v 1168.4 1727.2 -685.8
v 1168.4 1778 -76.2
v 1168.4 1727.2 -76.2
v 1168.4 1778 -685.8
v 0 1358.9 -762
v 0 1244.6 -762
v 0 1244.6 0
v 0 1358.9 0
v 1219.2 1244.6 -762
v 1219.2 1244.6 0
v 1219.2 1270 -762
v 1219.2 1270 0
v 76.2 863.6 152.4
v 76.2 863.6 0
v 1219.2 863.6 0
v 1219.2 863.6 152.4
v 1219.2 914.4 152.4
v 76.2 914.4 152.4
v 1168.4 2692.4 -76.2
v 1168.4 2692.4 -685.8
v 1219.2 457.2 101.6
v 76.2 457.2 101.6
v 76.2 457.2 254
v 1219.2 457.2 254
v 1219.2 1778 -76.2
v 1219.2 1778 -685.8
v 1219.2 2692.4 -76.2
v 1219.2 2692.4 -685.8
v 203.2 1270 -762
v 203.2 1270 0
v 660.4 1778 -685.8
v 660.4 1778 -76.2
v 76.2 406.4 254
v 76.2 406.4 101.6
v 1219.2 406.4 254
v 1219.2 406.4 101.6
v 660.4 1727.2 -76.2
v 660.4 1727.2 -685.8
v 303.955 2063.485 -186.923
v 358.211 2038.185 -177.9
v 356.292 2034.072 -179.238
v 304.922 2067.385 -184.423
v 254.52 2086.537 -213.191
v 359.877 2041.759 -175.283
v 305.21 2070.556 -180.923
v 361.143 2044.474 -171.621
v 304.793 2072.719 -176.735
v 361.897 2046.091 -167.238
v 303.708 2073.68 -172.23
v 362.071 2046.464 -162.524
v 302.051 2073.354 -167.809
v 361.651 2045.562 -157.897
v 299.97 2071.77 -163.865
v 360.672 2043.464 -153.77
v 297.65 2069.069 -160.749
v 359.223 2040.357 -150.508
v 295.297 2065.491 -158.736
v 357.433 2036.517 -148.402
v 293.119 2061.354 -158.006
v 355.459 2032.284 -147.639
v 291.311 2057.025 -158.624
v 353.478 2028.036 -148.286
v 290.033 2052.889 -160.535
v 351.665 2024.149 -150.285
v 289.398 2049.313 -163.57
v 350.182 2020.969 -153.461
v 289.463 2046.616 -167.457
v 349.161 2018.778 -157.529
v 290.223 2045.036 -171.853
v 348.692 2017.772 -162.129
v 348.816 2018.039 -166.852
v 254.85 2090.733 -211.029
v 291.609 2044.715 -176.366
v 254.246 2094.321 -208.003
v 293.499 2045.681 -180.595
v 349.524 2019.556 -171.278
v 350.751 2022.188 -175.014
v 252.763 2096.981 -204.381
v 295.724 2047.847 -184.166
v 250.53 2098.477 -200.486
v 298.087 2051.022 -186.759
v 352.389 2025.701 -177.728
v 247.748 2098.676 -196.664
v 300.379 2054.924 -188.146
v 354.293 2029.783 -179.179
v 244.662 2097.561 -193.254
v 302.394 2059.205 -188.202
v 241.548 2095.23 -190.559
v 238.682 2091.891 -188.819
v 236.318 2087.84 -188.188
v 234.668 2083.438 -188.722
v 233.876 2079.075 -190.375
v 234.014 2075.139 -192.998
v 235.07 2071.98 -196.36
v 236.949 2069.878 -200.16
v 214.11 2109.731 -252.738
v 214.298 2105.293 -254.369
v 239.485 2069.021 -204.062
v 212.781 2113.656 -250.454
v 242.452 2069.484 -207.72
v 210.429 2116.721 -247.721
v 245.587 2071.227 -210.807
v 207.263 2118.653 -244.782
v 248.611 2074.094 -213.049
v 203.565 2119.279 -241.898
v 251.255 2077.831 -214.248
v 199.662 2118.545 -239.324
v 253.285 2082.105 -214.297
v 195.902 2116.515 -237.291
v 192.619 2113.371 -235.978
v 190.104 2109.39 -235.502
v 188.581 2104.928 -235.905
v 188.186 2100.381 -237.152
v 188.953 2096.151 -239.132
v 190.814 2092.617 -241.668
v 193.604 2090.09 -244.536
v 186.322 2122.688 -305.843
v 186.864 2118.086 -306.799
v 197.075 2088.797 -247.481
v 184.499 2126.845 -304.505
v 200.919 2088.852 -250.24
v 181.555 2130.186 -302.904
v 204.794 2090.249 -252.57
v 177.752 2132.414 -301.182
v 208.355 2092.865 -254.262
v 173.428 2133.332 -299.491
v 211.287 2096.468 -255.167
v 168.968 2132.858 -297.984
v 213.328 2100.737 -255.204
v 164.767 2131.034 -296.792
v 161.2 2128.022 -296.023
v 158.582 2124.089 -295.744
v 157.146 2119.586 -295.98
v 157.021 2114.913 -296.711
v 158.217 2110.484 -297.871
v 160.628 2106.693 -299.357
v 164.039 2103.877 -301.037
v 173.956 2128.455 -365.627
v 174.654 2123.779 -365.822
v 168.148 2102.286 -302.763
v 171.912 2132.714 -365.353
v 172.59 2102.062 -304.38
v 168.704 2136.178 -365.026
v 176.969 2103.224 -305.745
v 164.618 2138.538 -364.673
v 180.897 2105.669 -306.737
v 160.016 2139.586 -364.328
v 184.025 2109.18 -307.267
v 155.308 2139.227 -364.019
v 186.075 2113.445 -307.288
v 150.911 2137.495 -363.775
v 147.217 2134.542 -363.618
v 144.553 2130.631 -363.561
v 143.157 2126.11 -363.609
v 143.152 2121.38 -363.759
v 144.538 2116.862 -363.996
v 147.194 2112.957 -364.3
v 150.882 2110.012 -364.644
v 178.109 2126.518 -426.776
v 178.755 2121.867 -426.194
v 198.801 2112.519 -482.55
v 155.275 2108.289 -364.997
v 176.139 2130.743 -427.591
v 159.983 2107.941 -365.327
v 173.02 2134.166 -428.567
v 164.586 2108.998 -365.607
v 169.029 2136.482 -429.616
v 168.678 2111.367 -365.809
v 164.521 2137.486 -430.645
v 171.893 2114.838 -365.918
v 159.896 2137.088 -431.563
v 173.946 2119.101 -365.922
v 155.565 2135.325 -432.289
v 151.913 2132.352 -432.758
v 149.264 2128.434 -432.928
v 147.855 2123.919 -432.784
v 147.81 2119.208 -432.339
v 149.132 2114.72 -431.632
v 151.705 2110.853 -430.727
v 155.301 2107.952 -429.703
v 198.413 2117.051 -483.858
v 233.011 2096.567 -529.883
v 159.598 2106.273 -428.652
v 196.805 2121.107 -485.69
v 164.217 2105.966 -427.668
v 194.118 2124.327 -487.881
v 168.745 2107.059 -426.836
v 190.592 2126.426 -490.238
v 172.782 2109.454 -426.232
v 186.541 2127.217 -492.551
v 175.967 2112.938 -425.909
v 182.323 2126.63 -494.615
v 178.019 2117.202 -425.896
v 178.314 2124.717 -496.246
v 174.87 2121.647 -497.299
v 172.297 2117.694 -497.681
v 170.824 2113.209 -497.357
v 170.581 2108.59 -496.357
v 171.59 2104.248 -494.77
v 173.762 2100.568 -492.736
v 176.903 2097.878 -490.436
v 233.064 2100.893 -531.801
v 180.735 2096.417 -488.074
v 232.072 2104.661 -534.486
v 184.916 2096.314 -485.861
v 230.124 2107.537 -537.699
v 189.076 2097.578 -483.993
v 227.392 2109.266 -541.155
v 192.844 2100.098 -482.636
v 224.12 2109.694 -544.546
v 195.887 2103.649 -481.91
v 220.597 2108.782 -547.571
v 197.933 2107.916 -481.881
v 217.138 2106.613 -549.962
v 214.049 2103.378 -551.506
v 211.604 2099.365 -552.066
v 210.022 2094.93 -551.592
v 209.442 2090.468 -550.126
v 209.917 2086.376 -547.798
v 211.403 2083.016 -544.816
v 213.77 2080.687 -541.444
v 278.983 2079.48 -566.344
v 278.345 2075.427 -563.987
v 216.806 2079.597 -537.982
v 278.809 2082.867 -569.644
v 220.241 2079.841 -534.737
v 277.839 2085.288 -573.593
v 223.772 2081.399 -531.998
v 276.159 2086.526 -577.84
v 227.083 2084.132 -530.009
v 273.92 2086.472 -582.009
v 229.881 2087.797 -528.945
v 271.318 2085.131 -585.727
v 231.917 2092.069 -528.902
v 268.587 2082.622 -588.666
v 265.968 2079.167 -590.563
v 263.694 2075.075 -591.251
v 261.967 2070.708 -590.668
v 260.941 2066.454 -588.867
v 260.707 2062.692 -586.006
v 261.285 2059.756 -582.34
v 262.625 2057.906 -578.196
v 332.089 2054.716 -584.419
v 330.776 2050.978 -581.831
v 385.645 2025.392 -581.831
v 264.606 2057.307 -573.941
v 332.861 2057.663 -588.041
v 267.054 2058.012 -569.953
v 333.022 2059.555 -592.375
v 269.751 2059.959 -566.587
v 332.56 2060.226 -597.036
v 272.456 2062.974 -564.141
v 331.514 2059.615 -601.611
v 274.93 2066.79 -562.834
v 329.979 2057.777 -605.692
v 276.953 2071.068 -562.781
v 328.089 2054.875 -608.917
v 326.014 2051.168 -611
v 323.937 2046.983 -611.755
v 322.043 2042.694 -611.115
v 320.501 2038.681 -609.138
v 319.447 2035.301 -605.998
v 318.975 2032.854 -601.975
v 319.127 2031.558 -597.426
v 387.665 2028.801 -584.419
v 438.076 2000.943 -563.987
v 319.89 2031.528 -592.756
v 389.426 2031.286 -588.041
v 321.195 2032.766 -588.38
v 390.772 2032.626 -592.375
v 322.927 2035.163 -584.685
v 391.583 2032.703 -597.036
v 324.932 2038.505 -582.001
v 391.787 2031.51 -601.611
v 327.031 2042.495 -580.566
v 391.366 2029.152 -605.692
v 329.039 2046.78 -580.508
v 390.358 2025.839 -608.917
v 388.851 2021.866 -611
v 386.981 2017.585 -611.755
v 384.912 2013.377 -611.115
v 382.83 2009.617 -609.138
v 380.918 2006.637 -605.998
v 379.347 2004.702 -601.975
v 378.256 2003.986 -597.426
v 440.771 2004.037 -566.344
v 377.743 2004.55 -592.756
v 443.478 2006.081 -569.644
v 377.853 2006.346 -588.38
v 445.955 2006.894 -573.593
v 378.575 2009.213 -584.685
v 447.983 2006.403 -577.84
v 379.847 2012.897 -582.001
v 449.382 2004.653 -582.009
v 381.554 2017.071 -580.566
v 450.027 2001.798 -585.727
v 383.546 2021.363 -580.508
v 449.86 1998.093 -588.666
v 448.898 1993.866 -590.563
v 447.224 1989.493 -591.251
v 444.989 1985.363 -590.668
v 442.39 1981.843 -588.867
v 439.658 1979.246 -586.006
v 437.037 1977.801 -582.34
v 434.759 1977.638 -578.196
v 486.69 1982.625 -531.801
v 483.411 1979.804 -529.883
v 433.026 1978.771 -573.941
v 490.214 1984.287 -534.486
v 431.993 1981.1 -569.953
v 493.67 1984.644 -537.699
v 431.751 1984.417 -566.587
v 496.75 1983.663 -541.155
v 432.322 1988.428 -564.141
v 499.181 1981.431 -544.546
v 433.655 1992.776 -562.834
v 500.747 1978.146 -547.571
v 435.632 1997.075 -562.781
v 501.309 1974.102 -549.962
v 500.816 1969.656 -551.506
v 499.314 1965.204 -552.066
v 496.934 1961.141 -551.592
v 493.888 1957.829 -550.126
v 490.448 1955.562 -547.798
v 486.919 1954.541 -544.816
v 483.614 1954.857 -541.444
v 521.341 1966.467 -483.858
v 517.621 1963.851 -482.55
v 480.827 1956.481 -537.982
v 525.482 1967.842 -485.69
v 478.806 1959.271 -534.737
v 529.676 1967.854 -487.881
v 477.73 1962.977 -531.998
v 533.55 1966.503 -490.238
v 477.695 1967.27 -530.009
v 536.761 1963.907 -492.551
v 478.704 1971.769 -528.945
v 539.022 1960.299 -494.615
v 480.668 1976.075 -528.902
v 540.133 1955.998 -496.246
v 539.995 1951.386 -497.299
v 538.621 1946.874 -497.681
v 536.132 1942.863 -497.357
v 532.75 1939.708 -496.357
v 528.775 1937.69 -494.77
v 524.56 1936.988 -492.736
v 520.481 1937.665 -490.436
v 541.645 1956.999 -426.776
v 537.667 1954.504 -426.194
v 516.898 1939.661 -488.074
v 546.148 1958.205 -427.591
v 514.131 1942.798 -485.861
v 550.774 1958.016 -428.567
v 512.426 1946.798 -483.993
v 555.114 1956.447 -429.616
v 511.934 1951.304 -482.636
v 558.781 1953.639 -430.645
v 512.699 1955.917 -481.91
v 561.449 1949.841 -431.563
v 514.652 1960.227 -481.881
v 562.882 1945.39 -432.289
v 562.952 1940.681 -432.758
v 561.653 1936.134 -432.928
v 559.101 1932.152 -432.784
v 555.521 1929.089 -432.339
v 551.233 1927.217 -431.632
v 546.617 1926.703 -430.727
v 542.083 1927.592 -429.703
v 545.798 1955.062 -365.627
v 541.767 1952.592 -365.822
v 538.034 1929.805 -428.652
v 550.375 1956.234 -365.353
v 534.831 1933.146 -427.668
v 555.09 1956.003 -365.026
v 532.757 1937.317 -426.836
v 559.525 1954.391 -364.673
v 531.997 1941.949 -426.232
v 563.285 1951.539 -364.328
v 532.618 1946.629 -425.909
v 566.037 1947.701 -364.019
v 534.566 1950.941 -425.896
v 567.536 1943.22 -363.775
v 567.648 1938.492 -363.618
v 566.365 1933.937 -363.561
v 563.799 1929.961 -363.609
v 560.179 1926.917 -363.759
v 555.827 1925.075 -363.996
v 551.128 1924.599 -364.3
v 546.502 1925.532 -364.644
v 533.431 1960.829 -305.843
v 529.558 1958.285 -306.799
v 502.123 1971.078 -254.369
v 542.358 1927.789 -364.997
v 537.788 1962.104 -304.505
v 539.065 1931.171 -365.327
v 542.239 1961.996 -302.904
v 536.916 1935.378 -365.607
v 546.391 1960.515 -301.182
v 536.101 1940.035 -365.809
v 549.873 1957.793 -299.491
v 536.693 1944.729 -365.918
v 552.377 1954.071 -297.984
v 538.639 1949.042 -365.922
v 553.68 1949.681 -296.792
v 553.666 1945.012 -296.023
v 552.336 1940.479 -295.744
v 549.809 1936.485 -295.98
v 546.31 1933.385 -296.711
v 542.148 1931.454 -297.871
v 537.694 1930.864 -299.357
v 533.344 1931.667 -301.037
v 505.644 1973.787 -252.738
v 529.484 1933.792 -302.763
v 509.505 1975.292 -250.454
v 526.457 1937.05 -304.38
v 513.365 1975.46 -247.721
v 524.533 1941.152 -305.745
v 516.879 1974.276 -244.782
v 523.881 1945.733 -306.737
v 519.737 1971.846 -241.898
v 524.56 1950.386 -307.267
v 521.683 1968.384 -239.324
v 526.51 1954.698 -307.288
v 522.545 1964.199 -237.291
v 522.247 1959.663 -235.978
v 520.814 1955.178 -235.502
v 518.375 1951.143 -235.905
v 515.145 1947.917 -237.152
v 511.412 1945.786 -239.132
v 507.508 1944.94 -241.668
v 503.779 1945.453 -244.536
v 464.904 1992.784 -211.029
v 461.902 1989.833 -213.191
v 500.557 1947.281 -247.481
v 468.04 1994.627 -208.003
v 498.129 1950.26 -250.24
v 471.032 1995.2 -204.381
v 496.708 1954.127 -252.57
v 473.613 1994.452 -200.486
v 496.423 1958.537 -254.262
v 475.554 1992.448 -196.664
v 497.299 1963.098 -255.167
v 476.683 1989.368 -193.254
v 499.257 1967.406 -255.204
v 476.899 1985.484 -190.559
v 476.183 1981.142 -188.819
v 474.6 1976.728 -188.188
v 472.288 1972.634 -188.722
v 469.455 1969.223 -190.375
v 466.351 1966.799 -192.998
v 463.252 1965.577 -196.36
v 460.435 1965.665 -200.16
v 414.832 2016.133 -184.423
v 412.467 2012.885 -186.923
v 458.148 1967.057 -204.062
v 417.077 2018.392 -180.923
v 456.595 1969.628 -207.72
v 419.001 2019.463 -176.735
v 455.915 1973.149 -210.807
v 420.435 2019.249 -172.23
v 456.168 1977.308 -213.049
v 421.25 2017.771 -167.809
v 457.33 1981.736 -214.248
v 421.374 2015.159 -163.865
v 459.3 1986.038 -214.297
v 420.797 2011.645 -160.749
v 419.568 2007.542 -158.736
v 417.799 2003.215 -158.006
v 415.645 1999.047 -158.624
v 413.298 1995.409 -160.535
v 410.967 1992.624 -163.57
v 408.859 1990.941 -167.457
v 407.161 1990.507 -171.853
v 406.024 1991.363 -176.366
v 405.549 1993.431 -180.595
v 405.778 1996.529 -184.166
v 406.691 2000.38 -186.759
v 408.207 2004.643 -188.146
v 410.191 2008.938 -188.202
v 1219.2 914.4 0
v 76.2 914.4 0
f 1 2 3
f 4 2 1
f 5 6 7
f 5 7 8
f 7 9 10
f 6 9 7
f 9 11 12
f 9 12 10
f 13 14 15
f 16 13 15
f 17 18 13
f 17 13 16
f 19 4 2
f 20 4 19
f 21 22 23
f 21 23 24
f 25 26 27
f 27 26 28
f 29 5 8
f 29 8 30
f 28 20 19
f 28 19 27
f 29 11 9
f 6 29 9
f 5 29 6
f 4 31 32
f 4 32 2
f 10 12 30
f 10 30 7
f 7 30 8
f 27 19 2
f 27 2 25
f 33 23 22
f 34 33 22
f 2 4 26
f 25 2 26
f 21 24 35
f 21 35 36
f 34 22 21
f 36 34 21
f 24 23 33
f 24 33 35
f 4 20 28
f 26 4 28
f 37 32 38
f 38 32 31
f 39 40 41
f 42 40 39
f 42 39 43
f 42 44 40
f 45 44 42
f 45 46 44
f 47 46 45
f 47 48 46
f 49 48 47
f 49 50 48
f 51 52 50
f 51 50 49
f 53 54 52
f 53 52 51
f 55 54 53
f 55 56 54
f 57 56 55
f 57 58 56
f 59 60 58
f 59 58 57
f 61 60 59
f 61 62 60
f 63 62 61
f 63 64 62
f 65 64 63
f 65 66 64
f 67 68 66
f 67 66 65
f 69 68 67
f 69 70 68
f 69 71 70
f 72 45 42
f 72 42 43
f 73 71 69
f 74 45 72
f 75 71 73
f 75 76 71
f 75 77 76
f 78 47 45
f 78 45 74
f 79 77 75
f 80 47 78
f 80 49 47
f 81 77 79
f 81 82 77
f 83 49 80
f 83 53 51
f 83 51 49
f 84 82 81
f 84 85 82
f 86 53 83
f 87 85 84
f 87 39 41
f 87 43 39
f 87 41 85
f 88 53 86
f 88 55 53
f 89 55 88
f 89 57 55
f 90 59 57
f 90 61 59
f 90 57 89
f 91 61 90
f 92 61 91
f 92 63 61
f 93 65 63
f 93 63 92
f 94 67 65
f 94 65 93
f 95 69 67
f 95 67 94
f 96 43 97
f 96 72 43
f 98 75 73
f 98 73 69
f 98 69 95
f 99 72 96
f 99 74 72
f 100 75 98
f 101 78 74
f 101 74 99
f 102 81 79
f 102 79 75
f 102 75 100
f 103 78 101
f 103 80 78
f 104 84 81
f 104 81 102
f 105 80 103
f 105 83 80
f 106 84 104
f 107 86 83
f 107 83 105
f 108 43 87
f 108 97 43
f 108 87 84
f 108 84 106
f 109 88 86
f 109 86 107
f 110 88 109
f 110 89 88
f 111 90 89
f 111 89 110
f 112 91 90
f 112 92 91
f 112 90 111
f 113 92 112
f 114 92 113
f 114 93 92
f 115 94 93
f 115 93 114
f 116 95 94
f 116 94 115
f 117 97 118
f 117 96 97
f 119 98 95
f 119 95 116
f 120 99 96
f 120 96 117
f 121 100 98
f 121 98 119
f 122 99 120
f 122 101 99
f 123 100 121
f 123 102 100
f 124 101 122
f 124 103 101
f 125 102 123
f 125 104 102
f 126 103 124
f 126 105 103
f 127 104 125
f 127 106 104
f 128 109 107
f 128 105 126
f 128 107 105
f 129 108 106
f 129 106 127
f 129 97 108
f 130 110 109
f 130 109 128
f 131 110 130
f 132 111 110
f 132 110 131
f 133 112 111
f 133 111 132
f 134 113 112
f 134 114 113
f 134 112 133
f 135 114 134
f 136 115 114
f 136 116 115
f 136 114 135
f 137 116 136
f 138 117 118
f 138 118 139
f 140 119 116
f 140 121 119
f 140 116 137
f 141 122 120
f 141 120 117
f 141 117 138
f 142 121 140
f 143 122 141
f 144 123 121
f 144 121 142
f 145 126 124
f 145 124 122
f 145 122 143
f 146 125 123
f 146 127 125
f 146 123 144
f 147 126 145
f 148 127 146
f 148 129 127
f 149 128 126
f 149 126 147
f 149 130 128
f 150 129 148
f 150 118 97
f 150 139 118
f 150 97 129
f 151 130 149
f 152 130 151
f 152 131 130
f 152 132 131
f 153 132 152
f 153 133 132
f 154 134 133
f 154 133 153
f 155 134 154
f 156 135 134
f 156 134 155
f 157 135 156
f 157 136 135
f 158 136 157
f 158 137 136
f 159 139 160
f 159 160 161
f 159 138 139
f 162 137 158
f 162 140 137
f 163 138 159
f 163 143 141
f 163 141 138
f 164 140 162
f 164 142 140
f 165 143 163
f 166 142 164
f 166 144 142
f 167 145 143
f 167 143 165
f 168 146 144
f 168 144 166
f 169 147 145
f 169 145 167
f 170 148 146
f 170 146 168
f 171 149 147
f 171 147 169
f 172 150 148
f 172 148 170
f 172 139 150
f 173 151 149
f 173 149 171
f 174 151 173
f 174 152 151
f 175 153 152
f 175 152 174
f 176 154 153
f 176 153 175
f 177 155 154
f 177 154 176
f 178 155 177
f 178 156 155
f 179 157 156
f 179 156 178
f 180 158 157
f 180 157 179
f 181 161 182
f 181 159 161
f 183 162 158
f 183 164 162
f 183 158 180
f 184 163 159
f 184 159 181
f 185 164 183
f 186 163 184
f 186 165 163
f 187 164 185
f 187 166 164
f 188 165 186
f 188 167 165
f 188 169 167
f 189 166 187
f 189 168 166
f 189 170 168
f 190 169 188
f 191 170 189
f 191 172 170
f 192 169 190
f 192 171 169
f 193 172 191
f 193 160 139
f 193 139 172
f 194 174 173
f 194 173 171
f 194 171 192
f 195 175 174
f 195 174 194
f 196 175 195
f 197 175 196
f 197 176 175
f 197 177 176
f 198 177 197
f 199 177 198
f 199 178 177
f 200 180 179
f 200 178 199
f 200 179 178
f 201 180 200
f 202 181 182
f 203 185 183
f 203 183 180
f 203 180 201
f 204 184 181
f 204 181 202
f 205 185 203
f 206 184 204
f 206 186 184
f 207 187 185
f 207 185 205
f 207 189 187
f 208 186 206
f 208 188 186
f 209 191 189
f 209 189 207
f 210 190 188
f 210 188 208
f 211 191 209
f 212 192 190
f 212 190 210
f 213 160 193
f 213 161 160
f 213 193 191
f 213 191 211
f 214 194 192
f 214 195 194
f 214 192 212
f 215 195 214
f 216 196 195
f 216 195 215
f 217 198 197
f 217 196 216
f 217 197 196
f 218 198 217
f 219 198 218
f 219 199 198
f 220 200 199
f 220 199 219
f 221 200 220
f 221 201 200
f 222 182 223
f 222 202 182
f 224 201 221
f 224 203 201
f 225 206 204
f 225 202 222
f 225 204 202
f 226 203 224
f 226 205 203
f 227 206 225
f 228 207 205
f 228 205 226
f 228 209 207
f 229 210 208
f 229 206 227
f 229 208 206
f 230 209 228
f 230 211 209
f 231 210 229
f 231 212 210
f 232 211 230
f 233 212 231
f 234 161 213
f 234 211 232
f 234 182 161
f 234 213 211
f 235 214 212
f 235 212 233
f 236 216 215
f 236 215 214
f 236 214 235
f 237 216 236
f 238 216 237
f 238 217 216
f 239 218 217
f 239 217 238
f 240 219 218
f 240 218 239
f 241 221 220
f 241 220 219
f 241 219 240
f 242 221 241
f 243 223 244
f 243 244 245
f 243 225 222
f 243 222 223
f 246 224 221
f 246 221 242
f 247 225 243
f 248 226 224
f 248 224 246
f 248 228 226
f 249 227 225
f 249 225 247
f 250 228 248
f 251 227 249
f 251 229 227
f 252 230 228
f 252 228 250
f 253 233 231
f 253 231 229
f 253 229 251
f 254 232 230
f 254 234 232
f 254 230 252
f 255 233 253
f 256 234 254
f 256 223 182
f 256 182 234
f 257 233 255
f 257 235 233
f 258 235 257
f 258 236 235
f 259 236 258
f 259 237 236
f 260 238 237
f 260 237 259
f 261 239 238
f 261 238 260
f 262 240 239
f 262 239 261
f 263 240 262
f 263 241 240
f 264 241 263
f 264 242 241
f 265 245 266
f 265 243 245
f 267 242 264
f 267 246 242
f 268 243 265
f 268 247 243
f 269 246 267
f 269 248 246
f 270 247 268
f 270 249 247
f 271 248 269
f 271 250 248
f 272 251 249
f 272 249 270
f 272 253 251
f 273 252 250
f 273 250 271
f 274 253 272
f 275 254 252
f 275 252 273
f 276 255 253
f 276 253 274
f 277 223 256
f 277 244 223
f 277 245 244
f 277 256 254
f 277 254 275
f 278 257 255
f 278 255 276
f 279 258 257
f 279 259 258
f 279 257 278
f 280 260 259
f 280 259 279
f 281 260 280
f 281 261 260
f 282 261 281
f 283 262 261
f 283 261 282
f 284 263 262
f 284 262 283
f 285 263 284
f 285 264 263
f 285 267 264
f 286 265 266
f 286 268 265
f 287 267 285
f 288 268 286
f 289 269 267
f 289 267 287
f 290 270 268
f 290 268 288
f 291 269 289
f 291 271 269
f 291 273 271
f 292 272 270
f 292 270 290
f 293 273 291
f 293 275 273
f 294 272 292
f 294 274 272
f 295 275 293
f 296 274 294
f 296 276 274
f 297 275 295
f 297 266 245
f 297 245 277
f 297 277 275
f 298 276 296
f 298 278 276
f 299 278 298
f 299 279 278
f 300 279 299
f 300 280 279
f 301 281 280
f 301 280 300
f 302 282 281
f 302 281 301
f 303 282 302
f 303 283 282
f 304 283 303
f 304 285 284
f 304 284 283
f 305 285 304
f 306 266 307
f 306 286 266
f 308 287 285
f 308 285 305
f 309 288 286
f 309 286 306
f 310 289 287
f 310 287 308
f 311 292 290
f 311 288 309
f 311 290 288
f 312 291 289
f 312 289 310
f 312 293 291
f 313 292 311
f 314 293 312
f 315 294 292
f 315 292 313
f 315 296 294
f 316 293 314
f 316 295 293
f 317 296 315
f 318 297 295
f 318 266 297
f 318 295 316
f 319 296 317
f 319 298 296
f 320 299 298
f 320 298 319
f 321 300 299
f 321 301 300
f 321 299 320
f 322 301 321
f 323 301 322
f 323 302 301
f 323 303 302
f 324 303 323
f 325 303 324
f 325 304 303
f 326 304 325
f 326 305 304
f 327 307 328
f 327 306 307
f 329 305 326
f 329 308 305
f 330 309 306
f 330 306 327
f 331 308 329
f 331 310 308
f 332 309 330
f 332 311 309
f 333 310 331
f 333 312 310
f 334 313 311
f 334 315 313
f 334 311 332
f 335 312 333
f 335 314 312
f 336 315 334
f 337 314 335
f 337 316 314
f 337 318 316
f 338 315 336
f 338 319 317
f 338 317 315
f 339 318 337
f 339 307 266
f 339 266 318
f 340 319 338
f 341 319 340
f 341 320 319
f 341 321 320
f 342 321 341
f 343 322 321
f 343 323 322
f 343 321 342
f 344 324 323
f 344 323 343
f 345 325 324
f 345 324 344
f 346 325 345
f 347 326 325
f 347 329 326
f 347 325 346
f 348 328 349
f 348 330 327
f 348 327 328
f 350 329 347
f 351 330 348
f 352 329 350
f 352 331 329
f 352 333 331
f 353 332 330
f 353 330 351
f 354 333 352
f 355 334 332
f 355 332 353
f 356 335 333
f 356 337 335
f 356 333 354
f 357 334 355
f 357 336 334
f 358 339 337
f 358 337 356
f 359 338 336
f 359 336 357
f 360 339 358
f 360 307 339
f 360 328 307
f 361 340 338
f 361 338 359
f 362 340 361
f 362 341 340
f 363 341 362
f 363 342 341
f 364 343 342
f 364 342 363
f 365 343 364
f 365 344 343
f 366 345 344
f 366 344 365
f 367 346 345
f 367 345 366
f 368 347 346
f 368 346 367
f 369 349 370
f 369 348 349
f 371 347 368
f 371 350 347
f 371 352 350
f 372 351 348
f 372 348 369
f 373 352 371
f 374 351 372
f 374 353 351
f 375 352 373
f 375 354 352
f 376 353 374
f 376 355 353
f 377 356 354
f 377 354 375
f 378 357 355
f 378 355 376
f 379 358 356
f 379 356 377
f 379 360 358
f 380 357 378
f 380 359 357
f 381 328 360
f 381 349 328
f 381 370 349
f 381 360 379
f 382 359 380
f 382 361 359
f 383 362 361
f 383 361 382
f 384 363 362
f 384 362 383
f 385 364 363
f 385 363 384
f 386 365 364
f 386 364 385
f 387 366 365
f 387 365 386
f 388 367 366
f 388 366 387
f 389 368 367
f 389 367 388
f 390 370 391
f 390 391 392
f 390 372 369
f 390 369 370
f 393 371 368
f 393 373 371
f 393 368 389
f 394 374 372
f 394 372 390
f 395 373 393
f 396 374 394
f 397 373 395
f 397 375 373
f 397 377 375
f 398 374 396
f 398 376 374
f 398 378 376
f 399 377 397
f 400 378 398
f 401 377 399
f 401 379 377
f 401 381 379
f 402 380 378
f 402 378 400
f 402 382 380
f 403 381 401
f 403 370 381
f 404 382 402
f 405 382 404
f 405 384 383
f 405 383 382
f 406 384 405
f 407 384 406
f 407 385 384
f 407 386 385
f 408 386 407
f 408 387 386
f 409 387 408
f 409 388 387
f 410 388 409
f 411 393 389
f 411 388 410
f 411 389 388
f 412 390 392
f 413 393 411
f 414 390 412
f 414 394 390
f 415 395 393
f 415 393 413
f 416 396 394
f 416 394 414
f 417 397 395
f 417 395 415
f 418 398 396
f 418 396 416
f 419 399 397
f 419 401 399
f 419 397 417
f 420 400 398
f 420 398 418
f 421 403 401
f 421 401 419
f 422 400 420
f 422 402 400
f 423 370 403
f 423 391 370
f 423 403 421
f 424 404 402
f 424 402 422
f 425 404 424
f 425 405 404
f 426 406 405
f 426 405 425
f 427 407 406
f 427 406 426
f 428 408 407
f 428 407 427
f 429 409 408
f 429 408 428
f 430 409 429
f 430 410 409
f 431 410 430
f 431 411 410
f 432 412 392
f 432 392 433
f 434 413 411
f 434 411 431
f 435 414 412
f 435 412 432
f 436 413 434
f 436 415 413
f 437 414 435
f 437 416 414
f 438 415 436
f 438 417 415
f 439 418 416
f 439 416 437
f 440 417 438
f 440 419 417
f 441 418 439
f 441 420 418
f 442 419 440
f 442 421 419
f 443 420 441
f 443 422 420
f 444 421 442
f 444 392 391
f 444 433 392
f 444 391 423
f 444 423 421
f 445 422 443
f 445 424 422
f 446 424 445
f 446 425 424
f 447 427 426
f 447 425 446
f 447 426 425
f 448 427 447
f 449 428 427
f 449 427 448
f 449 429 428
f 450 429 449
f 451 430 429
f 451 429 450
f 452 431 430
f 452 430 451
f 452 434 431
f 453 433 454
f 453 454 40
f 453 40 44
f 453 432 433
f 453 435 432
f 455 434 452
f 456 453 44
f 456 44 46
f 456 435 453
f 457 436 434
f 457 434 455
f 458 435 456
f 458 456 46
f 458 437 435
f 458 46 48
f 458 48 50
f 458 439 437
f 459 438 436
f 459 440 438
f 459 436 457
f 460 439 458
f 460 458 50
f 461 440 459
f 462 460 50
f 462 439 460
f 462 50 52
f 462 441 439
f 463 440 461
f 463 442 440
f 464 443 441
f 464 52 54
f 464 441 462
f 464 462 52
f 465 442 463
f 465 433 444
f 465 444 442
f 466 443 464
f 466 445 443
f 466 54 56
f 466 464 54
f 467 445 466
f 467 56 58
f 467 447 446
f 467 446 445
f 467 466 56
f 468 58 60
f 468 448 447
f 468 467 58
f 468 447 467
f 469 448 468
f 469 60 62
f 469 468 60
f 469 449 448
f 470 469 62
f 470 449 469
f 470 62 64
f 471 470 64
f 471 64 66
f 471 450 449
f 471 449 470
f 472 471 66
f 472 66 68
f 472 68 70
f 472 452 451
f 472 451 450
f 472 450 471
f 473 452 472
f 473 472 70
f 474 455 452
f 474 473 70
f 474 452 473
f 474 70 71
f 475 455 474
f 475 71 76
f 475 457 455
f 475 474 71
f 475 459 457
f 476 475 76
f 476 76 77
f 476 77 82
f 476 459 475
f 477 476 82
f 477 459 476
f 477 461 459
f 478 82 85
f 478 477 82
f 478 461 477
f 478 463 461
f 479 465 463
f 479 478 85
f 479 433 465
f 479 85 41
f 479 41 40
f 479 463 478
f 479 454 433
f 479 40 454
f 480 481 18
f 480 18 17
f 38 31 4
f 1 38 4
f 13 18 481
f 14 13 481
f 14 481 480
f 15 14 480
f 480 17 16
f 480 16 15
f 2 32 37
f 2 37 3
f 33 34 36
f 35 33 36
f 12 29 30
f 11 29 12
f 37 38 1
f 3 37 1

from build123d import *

# Parameters (mm, degrees)
STEP_2_2_W           = 1143
STEP_2_2_H           = 152.4
STEP_2_DEPTH         = 50.8
SKETCH4_W            = 1143
SKETCH4_H            = 152.4
STEP_1_DEPTH         = 50.8
SKETCH5_W            = 508
SKETCH5_H            = 609.6
SEAT_BOTTOM_DEPTH    = 50.8
SEAT_BACK_DEPTH      = 304.8
SEAT_BACK_DEPTH_BACK = 304.8
SKETCH6_W            = 50.8
SKETCH6_H            = 914.4
FLOOR_2_DEPTH        = 381
FLOOR_2_DEPTH_BACK   = 381
SKETCH12_R           = 15.875


with BuildPart() as part:
    # Step 2 2 → Step-2 (new body)
    with BuildSketch(Plane(origin=(0, 914.4, 0), x_dir=(1, 0, 0), z_dir=(0, 1, 0))):
        with Locations((647.7, -76.2)):
            Rectangle(STEP_2_2_W, STEP_2_2_H)
    extrude(amount=-STEP_2_DEPTH)


with BuildPart() as body_2:
    # Sketch4 → Step-1 (new body)
    with BuildSketch(Plane(origin=(0, 457.2, 0), x_dir=(1, 0, 0), z_dir=(0, 1, 0))):
        with Locations((647.7, -177.8)):
            Rectangle(SKETCH4_W, SKETCH4_H)
    extrude(amount=-STEP_1_DEPTH)


with BuildPart() as body_3:
    # Sketch5 → Seat-Bottom (new body)
    with BuildSketch(Plane(origin=(0, 1778, 0), x_dir=(1, 0, 0), z_dir=(0, 1, 0))):
        with Locations((914.4, 381)):
            Rectangle(SKETCH5_W, SKETCH5_H)
    extrude(amount=-SEAT_BOTTOM_DEPTH)


with BuildPart() as body_4:
    # Sketch6 → Seat-Back (new, two sides: drawn at the far end of the back side and taken through both)
    with BuildSketch(Plane.XY.offset(-381).offset(-SEAT_BACK_DEPTH_BACK)):
        with Locations((1193.8, 2235.2)):
            Rectangle(SKETCH6_W, SKETCH6_H)
    extrude(amount=SEAT_BACK_DEPTH + SEAT_BACK_DEPTH_BACK)


with BuildPart() as body_5:
    # Sketch7 → Floor 2 (new, two sides: drawn at the far end of the back side and taken through both)
    with BuildSketch(Plane.XY.offset(-381).offset(-FLOOR_2_DEPTH_BACK)):
        Polygon((0, 1358.9), (203.2, 1270), (1219.2, 1270), (1219.2, 1244.6), (0, 1244.6), align=None)
    extrude(amount=FLOOR_2_DEPTH + FLOOR_2_DEPTH_BACK)


with BuildPart() as body_6:
    # Sweep1: sweep along a path in Wheel Center
    with BuildLine(Plane(origin=(841.813517207, 1805.274913428, 0), x_dir=(0, 0, 1), z_dir=(-0.42261826174069383, -0.9063077870366526, 0))) as sweep1_path:
        CenterArc((-381, 536.725192411), 217.4875, 0, 360)
    # Sketch12 → Sweep1 (sweep)
    with BuildSketch(Plane.XY.offset(-381)):
        with Locations((158.264680993, 2124.018970477)):
            Circle(SKETCH12_R)
    sweep(path=sweep1_path.line)


solid = Compound([part.part, body_2.part, body_3.part, body_4.part, body_5.part, body_6.part])
